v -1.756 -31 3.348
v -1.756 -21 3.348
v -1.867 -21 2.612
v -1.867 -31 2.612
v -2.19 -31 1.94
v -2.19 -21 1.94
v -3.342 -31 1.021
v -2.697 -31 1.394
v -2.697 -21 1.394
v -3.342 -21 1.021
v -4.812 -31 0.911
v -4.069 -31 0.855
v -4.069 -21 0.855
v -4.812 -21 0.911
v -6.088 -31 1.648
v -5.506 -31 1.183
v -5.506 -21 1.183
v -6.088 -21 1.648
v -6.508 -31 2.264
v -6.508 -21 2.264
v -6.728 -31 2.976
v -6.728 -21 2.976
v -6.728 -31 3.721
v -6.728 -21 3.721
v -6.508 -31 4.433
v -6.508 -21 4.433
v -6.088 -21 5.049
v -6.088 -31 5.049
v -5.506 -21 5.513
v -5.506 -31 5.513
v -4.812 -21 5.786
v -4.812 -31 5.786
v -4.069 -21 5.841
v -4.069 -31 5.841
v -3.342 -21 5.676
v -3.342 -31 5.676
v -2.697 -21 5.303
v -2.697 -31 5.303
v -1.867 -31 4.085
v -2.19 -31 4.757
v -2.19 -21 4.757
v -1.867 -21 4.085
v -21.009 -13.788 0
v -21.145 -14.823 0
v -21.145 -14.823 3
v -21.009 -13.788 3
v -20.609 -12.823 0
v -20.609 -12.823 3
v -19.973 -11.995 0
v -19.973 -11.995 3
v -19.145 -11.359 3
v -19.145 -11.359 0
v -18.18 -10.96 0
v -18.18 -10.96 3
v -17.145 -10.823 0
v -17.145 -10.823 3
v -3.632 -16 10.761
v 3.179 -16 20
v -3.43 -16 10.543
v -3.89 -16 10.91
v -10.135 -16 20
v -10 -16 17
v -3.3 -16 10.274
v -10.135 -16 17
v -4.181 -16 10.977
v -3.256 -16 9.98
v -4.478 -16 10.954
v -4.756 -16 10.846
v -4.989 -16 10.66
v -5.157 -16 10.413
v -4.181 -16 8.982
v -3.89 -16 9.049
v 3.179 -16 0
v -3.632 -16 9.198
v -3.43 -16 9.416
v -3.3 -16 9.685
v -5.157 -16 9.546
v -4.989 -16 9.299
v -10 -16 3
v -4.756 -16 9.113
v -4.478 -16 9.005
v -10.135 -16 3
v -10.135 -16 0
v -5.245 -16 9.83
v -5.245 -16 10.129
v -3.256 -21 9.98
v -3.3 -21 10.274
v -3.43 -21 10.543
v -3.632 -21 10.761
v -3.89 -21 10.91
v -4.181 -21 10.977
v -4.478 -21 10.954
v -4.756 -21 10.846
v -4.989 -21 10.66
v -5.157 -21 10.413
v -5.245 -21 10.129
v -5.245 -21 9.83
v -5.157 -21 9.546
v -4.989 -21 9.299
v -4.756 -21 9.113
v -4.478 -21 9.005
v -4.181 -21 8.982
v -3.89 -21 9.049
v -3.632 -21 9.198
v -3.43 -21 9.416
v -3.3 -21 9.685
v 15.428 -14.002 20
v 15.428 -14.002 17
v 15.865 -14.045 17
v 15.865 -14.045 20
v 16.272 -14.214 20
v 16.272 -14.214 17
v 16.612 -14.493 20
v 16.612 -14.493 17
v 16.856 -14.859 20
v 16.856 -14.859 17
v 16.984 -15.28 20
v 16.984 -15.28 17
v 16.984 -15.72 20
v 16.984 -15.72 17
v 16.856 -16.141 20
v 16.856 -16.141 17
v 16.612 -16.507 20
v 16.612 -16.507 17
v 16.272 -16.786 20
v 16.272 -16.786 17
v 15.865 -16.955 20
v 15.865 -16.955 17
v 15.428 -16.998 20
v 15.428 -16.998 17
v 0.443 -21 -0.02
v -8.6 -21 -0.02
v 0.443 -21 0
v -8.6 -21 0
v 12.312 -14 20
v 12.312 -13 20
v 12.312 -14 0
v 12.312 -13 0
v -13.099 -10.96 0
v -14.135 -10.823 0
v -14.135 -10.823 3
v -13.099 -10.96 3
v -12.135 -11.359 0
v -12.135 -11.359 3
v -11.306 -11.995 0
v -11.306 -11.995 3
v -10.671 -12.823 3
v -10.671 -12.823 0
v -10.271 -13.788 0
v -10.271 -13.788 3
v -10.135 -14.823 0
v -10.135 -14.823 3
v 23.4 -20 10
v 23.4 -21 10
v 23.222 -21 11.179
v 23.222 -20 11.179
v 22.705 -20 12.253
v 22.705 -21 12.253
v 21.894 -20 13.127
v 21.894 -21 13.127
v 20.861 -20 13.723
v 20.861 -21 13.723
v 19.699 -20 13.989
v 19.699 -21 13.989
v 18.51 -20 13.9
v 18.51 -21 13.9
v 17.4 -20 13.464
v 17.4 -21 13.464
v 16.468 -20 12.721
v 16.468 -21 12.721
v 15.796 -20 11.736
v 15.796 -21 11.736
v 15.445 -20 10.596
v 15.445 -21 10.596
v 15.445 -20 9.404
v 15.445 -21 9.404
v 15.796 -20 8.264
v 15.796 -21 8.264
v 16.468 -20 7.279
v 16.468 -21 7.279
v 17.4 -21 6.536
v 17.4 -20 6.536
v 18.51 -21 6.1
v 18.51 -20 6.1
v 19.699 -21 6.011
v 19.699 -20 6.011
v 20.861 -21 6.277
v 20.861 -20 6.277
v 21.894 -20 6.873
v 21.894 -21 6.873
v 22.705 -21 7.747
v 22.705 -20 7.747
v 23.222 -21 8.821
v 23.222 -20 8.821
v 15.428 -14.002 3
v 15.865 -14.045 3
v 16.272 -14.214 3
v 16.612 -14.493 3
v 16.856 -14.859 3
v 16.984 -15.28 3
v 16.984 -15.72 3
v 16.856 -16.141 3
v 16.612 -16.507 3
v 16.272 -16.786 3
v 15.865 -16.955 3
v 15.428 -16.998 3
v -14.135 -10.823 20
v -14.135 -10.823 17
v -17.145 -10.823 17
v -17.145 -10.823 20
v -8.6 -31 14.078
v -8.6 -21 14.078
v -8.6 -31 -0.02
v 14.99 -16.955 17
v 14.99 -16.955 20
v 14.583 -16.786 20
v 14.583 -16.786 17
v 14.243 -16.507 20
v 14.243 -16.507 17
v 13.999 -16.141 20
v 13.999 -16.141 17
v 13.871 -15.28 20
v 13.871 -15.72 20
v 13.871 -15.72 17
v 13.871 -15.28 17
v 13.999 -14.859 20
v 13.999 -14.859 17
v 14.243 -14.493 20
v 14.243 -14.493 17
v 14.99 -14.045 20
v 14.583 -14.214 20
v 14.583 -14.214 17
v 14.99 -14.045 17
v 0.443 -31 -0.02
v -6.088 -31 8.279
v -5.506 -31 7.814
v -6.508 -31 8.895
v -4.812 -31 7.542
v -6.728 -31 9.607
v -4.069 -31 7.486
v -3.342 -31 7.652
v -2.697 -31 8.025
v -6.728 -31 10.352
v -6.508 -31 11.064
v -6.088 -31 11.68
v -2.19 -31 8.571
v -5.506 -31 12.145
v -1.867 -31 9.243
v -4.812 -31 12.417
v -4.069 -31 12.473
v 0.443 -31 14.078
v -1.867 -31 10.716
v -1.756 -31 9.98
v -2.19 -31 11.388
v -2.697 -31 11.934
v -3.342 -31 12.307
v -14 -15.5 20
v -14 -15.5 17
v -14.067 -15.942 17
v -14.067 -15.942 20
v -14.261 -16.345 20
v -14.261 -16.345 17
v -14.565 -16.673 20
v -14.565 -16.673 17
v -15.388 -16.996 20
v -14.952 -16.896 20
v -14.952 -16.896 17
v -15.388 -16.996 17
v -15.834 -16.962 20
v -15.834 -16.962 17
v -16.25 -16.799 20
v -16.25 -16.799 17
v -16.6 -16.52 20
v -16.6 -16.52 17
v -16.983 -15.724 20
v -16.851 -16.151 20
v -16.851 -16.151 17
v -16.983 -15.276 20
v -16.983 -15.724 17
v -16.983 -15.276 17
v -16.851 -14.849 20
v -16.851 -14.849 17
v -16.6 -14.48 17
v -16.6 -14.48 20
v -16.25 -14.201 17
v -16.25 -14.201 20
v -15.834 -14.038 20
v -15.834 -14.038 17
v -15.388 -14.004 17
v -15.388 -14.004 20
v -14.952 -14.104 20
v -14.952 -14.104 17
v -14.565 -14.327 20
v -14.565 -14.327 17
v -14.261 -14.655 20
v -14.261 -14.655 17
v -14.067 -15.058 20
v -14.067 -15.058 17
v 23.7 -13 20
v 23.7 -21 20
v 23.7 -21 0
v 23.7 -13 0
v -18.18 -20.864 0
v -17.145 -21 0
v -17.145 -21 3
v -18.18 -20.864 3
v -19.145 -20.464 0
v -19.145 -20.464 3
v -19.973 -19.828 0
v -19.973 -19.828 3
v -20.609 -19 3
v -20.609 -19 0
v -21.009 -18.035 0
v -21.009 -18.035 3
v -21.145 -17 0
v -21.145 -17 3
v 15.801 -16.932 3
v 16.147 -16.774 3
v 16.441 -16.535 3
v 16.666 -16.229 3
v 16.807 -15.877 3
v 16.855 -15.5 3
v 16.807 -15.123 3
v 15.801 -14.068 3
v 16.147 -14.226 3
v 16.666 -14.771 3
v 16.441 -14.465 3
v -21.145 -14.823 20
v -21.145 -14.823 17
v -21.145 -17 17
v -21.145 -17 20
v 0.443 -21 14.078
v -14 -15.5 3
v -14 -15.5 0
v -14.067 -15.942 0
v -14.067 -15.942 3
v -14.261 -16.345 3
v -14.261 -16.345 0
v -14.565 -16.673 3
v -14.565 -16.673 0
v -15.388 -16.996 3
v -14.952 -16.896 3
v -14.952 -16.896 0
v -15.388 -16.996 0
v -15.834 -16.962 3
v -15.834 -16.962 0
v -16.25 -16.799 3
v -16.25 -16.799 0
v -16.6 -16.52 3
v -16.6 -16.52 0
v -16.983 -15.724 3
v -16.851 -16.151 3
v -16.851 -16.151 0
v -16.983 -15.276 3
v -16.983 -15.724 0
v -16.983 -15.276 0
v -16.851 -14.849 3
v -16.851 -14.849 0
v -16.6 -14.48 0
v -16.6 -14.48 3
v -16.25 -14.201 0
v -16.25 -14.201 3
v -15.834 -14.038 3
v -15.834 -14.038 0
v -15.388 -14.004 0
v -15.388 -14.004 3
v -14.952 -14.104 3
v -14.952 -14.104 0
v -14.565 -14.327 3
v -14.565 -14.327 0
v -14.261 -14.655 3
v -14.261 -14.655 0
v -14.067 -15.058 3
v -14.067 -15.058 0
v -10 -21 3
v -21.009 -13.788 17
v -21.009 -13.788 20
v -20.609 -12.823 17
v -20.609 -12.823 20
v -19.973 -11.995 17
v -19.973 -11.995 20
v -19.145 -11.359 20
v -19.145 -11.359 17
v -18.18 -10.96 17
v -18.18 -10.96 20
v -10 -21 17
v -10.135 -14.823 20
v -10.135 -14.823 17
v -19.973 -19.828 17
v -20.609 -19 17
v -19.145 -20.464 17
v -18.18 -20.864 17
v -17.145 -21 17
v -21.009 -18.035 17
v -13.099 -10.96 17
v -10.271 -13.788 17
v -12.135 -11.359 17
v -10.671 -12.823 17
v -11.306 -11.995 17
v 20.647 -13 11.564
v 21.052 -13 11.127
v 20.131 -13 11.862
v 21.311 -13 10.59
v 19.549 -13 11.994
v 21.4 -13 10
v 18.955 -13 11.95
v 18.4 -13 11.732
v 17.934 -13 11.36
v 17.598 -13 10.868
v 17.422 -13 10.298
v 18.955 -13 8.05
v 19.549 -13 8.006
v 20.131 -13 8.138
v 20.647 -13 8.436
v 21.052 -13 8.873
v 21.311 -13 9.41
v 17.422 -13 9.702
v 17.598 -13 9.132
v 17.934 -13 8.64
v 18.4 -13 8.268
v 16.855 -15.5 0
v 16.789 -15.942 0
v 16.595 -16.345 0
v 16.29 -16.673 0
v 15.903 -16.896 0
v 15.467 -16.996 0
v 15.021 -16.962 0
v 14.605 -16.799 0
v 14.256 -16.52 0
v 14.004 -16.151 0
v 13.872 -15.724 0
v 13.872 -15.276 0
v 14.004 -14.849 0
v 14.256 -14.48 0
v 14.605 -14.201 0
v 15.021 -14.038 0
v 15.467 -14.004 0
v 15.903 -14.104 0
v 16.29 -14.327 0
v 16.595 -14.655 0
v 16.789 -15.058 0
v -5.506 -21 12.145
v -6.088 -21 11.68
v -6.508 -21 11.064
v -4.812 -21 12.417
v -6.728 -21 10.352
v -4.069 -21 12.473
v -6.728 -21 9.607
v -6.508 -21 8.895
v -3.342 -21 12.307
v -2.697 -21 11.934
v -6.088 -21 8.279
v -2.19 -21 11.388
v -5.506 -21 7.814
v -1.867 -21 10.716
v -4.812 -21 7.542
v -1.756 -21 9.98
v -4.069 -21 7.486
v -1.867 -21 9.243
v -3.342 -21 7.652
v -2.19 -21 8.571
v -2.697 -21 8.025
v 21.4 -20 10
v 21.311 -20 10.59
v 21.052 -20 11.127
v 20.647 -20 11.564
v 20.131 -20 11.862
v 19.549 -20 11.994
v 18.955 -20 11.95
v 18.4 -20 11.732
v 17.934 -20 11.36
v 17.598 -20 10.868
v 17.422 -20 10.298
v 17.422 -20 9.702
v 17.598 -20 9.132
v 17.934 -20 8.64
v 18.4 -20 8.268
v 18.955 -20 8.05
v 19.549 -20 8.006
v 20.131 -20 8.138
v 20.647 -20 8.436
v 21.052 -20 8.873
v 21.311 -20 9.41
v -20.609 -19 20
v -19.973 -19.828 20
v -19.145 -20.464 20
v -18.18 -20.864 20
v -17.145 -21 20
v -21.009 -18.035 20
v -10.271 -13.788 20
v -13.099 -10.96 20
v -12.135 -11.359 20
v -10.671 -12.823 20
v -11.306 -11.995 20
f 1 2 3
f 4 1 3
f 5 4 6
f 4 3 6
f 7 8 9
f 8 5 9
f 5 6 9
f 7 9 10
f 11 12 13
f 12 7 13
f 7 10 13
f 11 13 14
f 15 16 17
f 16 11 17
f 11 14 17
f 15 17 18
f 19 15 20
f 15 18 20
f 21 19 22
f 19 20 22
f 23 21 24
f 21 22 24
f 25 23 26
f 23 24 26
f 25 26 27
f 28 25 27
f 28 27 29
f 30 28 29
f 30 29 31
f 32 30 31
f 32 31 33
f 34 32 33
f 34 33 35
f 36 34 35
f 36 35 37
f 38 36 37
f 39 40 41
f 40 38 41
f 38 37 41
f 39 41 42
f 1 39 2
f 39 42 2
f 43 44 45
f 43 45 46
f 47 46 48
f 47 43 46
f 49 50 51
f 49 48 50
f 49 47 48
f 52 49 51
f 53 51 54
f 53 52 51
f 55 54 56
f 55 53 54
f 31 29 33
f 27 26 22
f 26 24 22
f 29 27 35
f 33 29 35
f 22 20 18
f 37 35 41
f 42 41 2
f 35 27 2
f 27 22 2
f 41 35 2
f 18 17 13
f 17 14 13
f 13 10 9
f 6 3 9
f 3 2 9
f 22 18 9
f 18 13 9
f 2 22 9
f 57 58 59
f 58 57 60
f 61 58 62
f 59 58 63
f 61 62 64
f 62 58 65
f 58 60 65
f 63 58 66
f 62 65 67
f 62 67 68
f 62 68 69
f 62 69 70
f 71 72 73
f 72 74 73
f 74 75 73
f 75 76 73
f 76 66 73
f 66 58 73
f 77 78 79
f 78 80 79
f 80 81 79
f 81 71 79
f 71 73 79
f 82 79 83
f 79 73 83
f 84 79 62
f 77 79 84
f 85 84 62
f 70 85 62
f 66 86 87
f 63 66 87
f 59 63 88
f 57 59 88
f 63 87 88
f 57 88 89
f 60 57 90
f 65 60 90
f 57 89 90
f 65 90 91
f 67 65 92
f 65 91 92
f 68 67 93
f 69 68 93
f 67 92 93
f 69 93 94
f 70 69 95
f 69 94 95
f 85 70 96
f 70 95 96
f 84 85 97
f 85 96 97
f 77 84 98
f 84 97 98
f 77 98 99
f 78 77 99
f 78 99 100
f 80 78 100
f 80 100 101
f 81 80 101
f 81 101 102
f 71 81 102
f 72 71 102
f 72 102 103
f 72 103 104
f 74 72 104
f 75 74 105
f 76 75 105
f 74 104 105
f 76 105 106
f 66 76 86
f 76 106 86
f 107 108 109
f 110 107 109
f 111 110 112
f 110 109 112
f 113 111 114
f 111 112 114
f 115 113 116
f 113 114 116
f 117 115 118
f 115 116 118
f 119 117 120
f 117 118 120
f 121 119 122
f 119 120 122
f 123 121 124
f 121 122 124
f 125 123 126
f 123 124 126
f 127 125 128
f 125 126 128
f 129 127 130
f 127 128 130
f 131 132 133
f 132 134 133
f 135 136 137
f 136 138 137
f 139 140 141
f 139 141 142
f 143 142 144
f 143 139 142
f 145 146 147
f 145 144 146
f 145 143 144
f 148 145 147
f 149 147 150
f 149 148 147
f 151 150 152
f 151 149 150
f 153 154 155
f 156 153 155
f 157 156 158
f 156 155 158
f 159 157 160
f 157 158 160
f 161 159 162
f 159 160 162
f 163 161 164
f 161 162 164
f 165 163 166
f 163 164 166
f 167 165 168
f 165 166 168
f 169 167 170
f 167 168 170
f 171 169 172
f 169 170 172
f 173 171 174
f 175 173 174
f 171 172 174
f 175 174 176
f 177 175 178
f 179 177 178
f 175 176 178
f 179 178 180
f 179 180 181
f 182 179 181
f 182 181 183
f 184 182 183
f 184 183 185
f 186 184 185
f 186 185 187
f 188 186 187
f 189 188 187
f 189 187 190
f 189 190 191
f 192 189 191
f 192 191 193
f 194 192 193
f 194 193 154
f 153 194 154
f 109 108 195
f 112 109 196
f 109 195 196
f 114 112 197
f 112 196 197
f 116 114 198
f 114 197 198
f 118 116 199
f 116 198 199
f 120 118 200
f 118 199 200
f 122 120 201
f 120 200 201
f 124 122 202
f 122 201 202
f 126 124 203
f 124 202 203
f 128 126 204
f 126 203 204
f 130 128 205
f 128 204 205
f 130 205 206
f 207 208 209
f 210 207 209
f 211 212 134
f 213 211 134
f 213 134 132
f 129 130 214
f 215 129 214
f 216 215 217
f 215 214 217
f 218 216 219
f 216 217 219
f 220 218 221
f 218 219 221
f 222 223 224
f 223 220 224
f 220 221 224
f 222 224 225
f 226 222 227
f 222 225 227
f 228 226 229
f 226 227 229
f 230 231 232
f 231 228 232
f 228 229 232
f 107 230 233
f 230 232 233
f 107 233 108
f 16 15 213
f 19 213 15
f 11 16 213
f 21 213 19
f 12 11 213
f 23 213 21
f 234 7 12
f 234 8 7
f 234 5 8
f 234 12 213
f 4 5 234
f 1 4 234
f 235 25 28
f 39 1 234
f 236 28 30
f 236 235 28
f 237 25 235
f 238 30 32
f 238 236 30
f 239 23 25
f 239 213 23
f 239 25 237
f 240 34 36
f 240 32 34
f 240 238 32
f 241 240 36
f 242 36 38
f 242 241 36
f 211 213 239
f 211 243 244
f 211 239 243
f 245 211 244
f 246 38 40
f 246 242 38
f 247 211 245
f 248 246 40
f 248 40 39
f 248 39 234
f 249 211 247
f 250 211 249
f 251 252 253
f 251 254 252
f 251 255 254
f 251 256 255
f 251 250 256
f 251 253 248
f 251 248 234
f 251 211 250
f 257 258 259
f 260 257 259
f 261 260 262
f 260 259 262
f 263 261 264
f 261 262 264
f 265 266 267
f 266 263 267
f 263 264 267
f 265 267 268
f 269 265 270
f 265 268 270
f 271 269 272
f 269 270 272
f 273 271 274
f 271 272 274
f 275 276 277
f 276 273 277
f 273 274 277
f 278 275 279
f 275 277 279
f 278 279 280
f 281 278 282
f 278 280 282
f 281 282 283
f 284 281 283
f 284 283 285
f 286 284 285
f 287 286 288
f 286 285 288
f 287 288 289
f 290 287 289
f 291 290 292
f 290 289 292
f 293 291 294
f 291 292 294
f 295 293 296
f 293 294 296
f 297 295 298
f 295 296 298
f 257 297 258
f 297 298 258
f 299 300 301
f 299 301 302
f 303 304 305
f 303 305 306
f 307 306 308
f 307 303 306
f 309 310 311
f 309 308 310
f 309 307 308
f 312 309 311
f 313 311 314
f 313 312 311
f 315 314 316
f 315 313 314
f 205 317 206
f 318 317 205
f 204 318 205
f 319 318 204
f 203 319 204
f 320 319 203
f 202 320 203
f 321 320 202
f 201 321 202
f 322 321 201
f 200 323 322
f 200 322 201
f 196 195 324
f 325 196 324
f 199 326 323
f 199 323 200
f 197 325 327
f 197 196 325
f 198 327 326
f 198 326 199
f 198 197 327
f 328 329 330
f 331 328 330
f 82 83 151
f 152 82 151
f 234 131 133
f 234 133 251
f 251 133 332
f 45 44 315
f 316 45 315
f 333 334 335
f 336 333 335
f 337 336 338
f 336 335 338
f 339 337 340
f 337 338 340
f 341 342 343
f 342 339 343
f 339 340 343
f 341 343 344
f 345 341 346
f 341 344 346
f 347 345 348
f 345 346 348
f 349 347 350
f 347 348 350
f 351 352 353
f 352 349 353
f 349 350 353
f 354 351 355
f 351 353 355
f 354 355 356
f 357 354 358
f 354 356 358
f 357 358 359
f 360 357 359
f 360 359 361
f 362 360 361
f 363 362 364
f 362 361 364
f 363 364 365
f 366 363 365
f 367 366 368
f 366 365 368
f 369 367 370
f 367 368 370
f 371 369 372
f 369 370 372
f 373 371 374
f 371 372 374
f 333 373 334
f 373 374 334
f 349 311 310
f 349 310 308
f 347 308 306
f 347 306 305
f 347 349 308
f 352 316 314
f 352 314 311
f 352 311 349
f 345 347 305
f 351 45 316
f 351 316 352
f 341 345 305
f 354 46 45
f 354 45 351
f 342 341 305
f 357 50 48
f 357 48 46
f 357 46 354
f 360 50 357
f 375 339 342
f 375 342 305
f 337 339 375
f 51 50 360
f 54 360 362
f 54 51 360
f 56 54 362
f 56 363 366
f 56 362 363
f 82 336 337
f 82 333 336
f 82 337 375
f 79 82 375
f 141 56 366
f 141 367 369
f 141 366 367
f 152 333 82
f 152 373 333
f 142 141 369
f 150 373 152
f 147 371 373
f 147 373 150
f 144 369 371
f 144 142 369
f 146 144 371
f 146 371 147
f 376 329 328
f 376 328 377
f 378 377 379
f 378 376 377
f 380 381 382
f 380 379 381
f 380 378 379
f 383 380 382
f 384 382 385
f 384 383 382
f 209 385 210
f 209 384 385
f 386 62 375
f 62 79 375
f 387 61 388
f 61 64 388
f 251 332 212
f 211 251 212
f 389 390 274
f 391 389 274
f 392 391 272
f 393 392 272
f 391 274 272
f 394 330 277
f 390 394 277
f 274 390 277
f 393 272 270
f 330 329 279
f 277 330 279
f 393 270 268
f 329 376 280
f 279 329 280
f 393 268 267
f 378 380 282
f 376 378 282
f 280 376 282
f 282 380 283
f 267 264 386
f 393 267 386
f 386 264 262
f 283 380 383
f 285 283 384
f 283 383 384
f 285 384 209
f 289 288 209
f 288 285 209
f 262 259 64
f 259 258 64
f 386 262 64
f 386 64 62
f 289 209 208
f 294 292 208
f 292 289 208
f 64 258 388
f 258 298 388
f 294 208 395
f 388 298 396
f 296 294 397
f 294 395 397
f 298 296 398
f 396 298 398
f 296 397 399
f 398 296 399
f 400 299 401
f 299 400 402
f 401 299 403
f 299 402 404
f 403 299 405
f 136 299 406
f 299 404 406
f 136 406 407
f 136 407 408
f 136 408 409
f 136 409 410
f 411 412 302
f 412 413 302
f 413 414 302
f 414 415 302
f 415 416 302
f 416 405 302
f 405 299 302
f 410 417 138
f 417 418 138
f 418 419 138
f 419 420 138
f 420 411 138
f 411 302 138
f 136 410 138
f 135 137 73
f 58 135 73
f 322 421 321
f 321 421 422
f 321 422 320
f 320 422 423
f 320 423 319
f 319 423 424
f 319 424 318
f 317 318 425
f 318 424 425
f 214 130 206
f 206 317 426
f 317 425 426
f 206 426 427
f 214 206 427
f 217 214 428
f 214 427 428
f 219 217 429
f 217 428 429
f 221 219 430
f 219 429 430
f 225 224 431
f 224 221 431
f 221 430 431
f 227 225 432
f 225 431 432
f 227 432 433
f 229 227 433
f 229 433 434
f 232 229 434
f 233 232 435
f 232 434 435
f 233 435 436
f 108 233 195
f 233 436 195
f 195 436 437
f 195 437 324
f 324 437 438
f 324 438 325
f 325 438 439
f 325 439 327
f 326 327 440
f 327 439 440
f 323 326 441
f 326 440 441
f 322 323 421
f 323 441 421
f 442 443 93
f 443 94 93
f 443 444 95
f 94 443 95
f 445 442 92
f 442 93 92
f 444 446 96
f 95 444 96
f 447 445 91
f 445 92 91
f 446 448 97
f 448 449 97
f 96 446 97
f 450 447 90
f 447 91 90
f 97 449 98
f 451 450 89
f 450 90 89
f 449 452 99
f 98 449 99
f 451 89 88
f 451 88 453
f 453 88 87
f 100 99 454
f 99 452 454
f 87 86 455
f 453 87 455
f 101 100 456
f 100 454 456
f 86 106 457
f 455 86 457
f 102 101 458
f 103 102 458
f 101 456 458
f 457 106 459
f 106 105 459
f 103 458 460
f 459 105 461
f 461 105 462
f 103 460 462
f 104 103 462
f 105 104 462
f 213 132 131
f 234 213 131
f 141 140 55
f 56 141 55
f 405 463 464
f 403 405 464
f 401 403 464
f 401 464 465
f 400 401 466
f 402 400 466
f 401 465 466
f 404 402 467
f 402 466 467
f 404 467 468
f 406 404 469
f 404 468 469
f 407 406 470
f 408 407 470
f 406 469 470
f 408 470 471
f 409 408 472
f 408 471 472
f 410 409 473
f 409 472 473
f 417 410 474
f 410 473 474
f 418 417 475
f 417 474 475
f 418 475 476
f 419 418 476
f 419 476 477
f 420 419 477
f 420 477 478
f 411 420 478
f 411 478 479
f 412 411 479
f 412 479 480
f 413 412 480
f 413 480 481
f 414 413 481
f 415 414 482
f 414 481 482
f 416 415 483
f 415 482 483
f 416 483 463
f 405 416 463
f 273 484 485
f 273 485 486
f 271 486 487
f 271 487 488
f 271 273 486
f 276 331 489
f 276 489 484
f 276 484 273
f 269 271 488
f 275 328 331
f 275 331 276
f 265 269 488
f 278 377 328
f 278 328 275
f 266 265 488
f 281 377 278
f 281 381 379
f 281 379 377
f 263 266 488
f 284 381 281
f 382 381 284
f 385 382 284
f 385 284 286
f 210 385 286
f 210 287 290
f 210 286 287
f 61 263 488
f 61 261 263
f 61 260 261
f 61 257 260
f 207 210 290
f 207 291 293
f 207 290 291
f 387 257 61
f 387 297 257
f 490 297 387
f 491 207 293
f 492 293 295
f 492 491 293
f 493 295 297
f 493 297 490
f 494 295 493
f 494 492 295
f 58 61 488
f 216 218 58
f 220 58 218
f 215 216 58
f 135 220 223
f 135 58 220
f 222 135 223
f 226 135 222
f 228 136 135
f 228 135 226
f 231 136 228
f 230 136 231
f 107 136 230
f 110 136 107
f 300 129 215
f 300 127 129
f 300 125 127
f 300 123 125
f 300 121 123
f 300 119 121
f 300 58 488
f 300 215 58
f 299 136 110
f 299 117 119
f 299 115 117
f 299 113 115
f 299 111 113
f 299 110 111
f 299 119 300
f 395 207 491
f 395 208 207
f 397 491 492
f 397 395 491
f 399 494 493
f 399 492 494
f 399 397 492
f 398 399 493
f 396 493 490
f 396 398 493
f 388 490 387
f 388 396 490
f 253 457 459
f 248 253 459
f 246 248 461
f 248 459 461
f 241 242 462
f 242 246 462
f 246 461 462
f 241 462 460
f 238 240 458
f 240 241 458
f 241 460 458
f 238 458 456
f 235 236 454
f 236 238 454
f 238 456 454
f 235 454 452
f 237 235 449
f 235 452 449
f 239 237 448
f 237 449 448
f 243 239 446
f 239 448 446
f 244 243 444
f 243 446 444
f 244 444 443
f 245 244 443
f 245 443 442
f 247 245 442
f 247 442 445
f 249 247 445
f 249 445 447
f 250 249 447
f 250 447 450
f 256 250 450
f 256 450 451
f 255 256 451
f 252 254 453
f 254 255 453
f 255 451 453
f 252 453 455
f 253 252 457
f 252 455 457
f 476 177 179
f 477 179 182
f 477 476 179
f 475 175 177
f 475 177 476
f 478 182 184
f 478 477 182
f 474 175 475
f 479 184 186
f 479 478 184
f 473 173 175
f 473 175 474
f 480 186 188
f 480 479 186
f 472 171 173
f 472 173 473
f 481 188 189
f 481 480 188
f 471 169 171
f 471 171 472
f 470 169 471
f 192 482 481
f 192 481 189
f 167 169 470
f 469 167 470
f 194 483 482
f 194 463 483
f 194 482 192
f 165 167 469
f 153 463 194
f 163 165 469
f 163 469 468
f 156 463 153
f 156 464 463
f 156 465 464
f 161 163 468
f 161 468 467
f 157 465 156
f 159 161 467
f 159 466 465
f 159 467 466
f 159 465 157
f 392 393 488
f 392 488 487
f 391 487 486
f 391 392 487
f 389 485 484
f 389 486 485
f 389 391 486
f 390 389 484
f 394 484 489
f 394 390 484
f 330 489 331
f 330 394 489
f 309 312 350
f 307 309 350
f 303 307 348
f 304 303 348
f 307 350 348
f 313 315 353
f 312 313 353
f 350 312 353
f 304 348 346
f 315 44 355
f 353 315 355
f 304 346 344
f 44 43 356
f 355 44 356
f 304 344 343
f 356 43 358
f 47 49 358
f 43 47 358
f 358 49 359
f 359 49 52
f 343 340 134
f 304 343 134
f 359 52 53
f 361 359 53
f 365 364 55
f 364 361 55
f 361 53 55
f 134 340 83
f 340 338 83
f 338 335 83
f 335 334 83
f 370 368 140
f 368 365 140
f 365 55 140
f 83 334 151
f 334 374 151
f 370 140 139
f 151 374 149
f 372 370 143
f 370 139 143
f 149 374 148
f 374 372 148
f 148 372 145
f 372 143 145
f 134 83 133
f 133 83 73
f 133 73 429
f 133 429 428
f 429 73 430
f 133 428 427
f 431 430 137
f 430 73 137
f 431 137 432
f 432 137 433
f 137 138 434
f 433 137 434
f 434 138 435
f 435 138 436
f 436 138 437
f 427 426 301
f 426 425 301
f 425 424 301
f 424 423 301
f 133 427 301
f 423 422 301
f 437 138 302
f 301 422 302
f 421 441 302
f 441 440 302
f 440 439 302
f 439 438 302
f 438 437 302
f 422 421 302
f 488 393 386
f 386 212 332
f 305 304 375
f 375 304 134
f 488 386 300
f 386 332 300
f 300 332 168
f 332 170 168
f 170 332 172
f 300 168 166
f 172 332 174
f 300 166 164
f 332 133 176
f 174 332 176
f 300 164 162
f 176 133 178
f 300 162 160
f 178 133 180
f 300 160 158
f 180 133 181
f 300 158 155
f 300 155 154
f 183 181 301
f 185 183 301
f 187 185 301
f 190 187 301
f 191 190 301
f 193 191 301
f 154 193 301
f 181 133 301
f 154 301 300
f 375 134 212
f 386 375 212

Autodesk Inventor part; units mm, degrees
ref_plane "YZ Plane" through (0, 0, 0) normal (1, 0, 0) x (0, 1, 0)
ref_plane "XZ Plane" through (0, 0, 0) normal (0, 1, 0) x (-1, 0, 0)
ref_plane "XY Plane" through (0, 0, 0) normal (0, 0, 1) x (1, 0, 0)
sketch "Sketch1" plane through (0, 0, 0) normal (0, 0, 1) x (1, 0, 0)
  line L0 (-17.1448, -21) -> (23.7, -21)
  line L1 (23.7, -21) -> (23.7, -13)
  line L2 (23.7, -13) -> (12.3117, -13)
  line L3 (12.3117, -13) -> (12.3117, -14)
  line L4 (12.3117, -14) -> (3.1793, -16)
  line L5 (3.1793, -16) -> (-10.1347, -16)
  line L6 (-10.1347, -16) -> (-10.1347, -14.8234)
  arc A0 (-10.1347, -14.8234) -> (-14.1347, -10.8234) centre (-14.1347, -14.8234) ccw
  line L7 (-14.1347, -10.8234) -> (-17.1448, -10.8234)
  arc A1 (-17.1448, -10.8234) -> (-21.1448, -14.8234) centre (-17.1448, -14.8234) ccw
  line L8 (-21.1448, -14.8234) -> (-21.1448, -17)
  arc A2 (-21.1448, -17) -> (-17.1448, -21) centre (-17.1448, -17) ccw
  circle A3 centre (-15.5, -15.5) radius 1.5
  circle A4 centre (15.3552, -15.5) radius 1.5
  point P0 (0, 0)
extrude "Extrusion1" add sketch "Sketch1" along normal blind 3
sketch "Sketch2" plane through (0, 0, 3) normal (0, 0, 1) x (1, 0, 0)
  circle A0 centre (15.3552, -15.5) radius 1.5 projected
  line L0 (-10, -16) -> (-10, -21)
  line L1 (23.7, -21) -> (-10, -21)
  line L2 (23.7, -13) -> (23.7, -21)
  line L3 (12.3117, -13) -> (23.7, -13)
  line L4 (12.3117, -14) -> (12.3117, -13)
  line L5 (3.1793, -16) -> (12.3117, -14)
  line L6 (-10, -16) -> (3.1793, -16)
  circle A1 centre (15.5, -15.5) radius 1.5
  point P0 (0, 0)
extrude "Extrusion2" add sketch "Sketch2" along normal blind 14
sketch "Sketch4" plane through (0, 0, 17) normal (0, 0, 1) x (1, 0, 0)
  line L0 (-10, -16) -> (-10, -21) projected
  line L1 (-10, -21) -> (23.7, -21) projected
  line L2 (23.7, -21) -> (23.7, -13) projected
  line L3 (23.7, -13) -> (12.3117, -13) projected
  line L4 (12.3117, -13) -> (12.3117, -14) projected
  line L5 (12.3117, -14) -> (3.1793, -16) projected
  line L6 (3.1793, -16) -> (-10, -16) projected
  arc A0 (15.4276, -14.0017) -> (15.4276, -16.9983) centre (15.3552, -15.5) ccw projected
  arc A1 (15.4276, -16.9983) -> (15.4276, -14.0017) centre (15.5, -15.5) ccw projected
  line L7 (-10, -21) -> (-10, -16) projected
  line L8 (-10, -16) -> (-10.1347, -16) projected
  line L9 (-10.1347, -16) -> (-10.1347, -14.8234) projected
  arc A2 (-10.1347, -14.8234) -> (-14.1347, -10.8234) centre (-14.1347, -14.8234) ccw projected
  line L10 (-14.1347, -10.8234) -> (-17.1448, -10.8234) projected
  arc A3 (-17.1448, -10.8234) -> (-21.1448, -14.8234) centre (-17.1448, -14.8234) ccw projected
  line L11 (-21.1448, -14.8234) -> (-21.1448, -17) projected
  arc A4 (-21.1448, -17) -> (-17.1448, -21) centre (-17.1448, -17) ccw projected
  line L12 (-17.1448, -21) -> (-10, -21) projected
  circle A5 centre (-15.5, -15.5) radius 1.5 projected
  point P0 (0, 0)
extrude "Extrusion3" add sketch "Sketch4" along normal blind 3
sketch "Sketch5" plane through (-17.1448, -21, 0) normal (0, -1, 0) x (1, 0, 0)
  line L0 (7.1448, 3) -> (7.1448, 17) projected
  circle A0 centre (12.889, 3.3484) radius 2.5
  circle A1 centre (12.889, 9.9795) radius 2.5
  line L1 (8.5448, -0.0205) -> (17.5875, -0.0205)
  line L2 (17.5875, -0.0205) -> (17.5875, 14.0778)
  line L3 (17.5875, 14.0778) -> (8.5448, 14.0778)
  line L4 (8.5448, 14.0778) -> (8.5448, -0.0205)
  point P0 (17.1448, 0)
  point P1 (17.1448, -14)
  dimension "d6" = 5
  dimension "d8" = 5
  dimension "d9" = 4.0983
  dimension "d10" = 4.6985
  dimension "d11" = 3.3689
  dimension "d12" = 4.3442
  dimension "d13" = 6.6311
  dimension "d14" = 1.4
extrude "Extrusion4" add sketch "Sketch5" along normal blind 10
sketch "Sketch6" plane through (-4.2558, -21, 9.9795) normal (0, -1, 0) x (1, 0, 0)
  circle A0 centre (0, 0) radius 2.5 projected
  circle A1 centre (0, 0) radius 1
  point P0 (4.2558, -9.9795)
  dimension "d17" = 2
extrude "Extrusion5" cut sketch "Sketch6" against normal blind 10 contours A1
sketch "Sketch7" plane through (-17.1448, -21, 0) normal (0, -1, 0) x (1, 0, 0)
  line L0 (17.5875, 0) -> (40.8448, 0) projected
  line L1 (40.8448, 0) -> (40.8448, 20) projected
  circle A0 centre (36.5448, 10) radius 4
  point P0 (17.1448, 0)
  dimension "d21" = 4.3
  dimension "d22" = 10
  dimension "d23" = 8
extrude "Extrusion6" cut sketch "Sketch7" against normal blind 1
sketch "Sketch8" plane through (19.4, -20, 10) normal (0, -1, 0) x (1, 0, 0)
  circle A0 centre (0, 0) radius 4 projected
  circle A1 centre (0, 0) radius 2
  point P0 (-19.4, -10)
  dimension "d26" = 4
extrude "Extrusion7" cut sketch "Sketch8" against normal blind 11 contours A1
properties part number "exTop"
